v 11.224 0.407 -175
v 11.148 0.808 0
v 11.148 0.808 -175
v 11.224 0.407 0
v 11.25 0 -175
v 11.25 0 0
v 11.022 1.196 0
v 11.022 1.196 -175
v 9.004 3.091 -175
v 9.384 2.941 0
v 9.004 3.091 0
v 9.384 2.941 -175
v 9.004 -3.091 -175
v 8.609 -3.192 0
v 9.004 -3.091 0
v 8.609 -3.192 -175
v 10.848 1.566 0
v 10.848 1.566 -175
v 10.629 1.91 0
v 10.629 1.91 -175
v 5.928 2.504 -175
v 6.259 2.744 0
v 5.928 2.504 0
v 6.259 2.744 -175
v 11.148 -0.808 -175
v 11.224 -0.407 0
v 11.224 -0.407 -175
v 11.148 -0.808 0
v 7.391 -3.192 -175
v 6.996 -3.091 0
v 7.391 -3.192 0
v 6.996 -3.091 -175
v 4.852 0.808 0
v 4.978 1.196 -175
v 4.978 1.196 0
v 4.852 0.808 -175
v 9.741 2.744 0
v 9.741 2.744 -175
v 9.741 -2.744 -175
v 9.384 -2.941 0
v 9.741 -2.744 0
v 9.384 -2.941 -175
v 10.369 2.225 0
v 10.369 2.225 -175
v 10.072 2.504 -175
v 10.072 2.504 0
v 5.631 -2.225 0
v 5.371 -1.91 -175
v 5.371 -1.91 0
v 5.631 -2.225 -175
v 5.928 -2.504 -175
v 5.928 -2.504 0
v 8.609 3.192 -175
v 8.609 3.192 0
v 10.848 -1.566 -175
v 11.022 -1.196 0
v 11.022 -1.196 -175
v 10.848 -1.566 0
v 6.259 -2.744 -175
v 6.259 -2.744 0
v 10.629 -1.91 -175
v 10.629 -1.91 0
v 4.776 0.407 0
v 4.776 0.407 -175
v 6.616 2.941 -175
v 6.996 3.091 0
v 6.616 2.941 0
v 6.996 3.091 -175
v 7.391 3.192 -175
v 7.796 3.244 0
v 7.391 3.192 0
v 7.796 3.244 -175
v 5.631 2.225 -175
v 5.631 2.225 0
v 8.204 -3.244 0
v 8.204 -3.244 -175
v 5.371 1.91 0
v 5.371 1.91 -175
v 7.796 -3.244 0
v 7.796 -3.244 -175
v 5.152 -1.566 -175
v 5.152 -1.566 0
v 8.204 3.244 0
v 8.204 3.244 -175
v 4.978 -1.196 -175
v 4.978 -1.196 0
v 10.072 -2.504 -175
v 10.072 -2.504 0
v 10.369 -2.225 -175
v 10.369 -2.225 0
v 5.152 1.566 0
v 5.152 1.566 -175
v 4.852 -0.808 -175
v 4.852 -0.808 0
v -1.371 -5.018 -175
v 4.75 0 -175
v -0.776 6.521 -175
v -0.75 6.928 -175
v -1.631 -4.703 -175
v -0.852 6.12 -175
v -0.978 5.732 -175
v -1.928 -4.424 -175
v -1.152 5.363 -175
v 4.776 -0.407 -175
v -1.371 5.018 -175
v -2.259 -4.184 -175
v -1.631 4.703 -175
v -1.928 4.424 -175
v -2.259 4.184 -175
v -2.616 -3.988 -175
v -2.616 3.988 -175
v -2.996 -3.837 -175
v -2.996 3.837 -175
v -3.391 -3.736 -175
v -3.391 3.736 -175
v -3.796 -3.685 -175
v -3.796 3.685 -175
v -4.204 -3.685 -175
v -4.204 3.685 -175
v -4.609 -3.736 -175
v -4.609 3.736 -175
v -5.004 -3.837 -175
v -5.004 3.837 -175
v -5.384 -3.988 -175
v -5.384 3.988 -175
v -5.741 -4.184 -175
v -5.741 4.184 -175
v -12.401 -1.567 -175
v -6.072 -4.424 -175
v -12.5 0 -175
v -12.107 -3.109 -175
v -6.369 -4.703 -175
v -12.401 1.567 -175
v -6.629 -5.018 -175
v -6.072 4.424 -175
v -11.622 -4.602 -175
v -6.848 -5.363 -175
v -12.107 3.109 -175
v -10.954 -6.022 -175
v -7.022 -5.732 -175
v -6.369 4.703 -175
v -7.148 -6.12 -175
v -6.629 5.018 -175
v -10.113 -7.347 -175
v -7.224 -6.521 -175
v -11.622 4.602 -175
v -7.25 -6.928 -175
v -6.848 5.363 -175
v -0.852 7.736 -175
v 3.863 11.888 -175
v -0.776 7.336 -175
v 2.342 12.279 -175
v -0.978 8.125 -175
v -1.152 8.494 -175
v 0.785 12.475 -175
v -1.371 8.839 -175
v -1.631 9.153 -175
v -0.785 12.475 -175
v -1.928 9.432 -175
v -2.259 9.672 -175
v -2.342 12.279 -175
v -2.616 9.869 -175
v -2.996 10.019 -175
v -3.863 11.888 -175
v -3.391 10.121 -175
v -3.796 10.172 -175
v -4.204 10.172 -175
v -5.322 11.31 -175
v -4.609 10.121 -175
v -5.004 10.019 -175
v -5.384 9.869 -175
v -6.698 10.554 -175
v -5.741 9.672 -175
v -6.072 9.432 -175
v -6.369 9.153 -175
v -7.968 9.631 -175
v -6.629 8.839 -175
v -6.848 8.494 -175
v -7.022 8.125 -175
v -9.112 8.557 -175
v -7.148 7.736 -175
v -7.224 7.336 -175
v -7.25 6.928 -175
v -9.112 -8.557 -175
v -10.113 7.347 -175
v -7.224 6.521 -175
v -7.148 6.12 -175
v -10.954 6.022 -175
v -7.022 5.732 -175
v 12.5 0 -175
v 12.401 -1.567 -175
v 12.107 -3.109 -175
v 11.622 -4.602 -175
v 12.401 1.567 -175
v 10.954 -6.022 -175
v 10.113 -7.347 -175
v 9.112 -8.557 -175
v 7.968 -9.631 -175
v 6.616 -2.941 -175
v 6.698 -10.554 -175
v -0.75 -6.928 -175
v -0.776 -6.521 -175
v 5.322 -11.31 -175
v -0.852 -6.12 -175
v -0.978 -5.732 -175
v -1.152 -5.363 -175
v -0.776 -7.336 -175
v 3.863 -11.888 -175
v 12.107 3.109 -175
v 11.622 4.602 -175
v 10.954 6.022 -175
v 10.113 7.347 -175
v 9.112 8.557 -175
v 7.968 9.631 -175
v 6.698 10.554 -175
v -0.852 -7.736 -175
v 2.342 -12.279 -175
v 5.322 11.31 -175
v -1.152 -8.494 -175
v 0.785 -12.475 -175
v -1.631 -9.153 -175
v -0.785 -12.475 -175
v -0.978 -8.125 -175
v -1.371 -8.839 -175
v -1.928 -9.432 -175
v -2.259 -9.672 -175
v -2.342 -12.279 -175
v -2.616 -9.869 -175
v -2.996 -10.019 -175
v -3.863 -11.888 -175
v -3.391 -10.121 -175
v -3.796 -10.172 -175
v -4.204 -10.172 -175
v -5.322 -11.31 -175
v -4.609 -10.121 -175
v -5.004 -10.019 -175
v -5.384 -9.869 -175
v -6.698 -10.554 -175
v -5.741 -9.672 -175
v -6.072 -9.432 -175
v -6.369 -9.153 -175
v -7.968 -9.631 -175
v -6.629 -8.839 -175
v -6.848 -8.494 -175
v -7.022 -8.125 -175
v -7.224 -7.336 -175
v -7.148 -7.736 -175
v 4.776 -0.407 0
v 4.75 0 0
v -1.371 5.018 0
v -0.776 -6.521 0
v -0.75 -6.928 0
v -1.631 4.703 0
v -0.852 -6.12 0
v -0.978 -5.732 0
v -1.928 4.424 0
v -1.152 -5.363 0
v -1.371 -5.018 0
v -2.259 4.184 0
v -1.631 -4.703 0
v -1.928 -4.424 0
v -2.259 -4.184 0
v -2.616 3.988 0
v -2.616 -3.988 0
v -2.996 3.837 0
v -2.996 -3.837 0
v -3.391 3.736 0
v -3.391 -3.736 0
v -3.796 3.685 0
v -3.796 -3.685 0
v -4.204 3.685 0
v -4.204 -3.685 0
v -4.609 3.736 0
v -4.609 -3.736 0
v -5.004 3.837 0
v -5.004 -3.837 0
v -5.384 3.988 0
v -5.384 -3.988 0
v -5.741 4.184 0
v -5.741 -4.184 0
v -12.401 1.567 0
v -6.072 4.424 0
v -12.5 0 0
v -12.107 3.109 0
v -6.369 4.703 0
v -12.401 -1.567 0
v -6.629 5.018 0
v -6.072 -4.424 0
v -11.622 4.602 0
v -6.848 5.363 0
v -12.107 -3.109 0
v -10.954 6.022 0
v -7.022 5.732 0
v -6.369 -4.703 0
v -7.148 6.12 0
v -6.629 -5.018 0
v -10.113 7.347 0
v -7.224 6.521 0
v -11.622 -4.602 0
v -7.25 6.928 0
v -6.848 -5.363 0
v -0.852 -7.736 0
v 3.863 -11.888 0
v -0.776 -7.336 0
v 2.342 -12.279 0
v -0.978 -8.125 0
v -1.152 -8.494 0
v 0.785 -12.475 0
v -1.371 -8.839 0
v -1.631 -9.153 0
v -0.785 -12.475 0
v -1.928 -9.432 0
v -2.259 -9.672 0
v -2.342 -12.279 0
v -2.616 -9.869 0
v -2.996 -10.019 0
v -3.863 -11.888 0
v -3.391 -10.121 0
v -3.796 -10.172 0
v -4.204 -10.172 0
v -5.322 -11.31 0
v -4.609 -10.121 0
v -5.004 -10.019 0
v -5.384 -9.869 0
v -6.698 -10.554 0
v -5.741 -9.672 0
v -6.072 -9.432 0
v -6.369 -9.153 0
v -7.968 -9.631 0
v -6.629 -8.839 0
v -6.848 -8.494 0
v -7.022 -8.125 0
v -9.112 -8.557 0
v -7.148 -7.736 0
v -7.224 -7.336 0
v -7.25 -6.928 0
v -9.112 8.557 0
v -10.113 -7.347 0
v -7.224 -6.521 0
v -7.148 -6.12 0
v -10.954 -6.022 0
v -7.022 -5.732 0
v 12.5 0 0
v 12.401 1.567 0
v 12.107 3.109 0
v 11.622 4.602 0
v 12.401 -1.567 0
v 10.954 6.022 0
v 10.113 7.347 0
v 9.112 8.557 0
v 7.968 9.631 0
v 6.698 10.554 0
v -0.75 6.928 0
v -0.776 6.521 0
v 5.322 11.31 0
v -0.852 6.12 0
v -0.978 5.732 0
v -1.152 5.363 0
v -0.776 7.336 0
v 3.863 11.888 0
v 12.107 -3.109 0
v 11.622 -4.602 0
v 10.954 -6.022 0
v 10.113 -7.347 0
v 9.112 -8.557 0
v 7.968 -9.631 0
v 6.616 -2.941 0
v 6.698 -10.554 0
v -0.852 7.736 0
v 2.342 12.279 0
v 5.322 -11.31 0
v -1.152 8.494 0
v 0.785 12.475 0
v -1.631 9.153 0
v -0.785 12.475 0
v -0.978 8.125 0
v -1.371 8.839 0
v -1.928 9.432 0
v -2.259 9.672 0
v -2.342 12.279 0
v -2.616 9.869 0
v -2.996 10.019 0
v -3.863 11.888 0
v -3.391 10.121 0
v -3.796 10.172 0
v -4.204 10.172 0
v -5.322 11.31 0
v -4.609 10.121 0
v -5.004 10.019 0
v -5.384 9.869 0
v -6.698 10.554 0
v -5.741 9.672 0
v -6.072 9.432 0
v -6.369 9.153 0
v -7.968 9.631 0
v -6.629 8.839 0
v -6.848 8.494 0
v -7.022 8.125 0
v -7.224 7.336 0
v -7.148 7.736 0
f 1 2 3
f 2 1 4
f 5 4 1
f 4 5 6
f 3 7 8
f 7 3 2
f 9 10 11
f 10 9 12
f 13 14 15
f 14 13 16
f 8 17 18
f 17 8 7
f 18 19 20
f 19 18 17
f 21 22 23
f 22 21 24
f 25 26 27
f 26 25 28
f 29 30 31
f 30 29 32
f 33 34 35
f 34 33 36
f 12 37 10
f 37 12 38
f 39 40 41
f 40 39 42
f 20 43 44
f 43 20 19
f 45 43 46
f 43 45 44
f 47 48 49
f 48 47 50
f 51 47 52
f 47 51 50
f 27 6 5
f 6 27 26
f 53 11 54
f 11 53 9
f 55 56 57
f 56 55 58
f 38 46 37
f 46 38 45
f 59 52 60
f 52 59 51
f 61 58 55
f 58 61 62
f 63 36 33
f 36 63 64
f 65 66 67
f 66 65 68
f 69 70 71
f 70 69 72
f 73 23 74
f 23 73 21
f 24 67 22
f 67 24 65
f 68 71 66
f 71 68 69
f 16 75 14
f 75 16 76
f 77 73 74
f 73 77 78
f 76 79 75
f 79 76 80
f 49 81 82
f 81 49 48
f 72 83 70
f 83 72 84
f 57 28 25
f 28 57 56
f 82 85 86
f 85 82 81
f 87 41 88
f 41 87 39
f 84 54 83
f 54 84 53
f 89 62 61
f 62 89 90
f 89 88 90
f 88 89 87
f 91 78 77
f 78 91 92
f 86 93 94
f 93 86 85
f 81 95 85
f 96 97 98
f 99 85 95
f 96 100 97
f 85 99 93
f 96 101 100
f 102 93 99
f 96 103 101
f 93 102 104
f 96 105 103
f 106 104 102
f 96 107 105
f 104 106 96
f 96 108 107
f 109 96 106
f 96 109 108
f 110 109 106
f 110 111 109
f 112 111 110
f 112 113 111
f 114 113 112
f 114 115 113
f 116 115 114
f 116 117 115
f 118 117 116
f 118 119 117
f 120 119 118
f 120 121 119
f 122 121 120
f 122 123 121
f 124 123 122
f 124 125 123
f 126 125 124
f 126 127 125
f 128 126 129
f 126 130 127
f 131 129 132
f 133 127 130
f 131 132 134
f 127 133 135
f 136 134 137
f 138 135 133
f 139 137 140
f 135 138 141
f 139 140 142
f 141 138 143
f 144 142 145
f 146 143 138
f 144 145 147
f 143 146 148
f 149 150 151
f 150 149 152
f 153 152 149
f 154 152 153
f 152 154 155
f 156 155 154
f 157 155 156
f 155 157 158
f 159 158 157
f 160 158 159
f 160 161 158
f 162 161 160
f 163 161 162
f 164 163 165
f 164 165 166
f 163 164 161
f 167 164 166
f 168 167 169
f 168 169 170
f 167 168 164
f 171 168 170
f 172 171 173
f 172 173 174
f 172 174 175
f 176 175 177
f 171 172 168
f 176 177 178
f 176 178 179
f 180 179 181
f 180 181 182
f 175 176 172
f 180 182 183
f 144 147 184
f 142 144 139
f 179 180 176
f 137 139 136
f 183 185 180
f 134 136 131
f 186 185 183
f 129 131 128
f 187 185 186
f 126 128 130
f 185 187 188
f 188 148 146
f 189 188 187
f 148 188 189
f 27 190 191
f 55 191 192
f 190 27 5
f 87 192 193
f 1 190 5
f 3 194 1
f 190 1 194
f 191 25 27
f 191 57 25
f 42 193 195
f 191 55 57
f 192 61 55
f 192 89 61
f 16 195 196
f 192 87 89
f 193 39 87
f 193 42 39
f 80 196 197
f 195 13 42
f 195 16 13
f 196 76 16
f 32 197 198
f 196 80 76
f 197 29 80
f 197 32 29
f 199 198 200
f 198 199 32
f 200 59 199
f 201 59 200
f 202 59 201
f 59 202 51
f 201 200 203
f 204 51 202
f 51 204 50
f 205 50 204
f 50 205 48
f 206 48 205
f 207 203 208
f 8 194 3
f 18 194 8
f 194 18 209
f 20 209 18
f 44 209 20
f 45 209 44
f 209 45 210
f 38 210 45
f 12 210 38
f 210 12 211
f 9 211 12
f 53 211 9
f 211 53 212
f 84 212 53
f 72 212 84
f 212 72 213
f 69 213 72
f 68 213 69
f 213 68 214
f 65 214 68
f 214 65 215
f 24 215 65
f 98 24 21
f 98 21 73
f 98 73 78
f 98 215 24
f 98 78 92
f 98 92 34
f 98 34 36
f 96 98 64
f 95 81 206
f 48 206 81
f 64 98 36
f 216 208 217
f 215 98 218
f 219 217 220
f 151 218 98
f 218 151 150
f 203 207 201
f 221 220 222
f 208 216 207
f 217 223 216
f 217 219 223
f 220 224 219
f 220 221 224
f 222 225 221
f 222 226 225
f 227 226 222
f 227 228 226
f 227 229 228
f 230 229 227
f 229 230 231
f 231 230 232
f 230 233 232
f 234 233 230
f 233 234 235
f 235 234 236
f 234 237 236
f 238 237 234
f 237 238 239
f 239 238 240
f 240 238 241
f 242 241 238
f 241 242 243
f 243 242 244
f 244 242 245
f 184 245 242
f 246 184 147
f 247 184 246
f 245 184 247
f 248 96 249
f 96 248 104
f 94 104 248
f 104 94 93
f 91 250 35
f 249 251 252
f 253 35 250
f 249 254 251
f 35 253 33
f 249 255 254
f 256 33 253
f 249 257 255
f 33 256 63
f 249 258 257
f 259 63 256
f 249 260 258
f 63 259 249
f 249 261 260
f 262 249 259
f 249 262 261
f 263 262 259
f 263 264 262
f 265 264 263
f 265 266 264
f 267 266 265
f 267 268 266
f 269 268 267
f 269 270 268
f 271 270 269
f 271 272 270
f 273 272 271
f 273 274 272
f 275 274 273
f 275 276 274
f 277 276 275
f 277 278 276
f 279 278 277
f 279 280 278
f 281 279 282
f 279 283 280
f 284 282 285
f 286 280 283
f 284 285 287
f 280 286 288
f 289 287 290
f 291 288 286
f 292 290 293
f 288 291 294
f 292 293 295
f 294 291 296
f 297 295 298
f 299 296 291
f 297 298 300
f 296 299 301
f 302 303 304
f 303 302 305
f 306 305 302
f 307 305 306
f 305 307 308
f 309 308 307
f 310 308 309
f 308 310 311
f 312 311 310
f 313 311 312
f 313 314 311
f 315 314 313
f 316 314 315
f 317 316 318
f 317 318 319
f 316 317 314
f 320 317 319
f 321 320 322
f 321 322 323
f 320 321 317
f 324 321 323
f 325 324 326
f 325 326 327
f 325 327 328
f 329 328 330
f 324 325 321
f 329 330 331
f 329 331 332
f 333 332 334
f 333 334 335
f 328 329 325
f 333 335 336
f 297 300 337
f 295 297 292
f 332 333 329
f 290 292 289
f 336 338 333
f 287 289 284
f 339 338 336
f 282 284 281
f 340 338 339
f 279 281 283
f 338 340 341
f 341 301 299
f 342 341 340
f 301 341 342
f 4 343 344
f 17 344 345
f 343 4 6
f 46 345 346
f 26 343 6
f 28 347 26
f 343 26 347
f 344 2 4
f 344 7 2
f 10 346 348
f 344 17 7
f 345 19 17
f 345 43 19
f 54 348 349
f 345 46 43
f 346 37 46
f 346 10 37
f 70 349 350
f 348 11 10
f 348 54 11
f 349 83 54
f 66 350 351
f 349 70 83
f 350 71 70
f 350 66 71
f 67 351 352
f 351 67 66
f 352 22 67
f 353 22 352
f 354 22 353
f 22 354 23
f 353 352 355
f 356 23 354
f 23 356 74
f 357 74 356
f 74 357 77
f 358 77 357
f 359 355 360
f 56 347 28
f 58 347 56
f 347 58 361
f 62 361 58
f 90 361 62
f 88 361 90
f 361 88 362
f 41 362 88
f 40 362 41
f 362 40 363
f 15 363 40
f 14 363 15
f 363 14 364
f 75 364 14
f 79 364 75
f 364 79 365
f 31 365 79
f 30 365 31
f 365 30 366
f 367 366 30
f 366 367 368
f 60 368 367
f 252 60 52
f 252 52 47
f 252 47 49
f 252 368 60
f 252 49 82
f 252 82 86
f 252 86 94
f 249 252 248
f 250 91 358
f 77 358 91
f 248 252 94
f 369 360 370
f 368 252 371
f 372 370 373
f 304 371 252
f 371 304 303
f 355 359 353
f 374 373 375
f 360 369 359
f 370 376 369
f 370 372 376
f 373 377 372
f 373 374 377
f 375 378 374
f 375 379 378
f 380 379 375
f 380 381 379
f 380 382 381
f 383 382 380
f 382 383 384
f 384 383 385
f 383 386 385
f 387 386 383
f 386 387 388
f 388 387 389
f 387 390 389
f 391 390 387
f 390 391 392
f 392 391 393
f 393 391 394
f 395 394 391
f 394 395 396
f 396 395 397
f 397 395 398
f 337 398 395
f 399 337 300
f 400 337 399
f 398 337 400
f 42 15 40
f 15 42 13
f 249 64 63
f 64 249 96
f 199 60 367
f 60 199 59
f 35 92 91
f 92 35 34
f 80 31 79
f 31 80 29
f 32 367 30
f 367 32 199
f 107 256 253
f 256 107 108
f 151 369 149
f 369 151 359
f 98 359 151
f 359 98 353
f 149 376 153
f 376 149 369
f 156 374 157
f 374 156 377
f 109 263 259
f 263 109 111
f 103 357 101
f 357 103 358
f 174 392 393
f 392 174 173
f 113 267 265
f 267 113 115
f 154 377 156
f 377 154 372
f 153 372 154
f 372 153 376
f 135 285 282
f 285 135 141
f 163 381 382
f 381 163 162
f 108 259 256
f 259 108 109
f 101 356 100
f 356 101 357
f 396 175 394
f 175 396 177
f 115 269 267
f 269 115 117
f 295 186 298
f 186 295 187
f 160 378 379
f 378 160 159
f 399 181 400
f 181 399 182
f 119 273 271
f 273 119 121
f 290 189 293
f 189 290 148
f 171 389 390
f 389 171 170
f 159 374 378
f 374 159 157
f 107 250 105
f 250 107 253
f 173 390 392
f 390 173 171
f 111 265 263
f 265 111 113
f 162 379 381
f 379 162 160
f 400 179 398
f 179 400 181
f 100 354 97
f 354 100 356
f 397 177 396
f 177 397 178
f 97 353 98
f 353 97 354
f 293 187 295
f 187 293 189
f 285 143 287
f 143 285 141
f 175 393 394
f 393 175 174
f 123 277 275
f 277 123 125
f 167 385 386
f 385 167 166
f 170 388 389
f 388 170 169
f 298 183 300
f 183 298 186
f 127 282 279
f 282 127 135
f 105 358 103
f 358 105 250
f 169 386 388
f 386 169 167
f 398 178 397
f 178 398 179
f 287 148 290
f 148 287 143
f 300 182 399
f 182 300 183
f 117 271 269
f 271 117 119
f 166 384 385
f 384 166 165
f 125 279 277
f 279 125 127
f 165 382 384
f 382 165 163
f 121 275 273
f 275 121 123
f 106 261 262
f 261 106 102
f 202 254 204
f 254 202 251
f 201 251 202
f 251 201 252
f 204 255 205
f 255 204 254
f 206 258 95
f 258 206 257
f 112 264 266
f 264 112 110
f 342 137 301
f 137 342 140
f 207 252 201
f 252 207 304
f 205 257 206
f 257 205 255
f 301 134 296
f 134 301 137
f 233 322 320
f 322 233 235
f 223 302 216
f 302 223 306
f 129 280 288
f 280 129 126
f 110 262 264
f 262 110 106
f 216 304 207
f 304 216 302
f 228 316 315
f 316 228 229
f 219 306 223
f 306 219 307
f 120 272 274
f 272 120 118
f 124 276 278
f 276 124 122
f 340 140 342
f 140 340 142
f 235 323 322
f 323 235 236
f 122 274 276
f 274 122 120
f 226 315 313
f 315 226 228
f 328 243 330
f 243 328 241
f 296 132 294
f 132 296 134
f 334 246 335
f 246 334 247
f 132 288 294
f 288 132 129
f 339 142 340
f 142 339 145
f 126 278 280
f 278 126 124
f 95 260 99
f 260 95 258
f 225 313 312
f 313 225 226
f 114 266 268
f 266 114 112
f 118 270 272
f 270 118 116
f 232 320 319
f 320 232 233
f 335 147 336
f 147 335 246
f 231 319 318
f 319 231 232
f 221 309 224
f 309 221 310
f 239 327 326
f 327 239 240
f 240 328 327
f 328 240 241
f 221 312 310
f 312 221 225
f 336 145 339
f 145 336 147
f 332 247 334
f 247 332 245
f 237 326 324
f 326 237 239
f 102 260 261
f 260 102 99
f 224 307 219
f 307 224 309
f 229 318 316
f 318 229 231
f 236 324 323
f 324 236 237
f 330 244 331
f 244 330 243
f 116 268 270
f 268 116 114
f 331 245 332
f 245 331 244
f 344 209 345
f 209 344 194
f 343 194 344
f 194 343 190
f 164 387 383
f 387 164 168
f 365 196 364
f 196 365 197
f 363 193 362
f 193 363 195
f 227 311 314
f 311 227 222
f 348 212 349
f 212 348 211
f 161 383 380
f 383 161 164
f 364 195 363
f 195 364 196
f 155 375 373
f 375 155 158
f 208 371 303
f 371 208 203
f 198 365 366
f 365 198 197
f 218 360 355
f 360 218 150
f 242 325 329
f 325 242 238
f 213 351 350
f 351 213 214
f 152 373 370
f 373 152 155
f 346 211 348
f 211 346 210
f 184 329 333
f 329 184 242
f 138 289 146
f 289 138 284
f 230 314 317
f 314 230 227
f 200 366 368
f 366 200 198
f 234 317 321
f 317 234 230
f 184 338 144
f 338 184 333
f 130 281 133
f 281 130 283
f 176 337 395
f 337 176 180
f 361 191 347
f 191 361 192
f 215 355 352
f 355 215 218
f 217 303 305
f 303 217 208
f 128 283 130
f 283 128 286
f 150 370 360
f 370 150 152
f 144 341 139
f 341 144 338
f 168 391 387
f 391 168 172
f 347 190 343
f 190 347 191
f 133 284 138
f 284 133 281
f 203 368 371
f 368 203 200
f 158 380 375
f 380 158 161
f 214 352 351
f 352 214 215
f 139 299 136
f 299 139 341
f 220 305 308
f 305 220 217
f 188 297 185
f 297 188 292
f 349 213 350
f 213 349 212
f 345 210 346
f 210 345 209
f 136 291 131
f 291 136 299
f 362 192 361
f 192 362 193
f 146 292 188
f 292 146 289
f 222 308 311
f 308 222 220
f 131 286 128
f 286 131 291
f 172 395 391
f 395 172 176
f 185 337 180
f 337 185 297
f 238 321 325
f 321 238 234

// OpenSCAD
$fn = 50;


difference() {
	union() {
		translate(v = [0, 0, -175.0000000000]) {
			cylinder(h = 175, r = 12.5000000000);
		}
	}
	union() {
		#translate(v = [8.0000000000, 0.0000000000, -175]) {
			cylinder(h = 175, r = 3.2500000000);
		}
		#translate(v = [-4.0000000000, 6.9282032303, -175]) {
			cylinder(h = 175, r = 3.2500000000);
		}
		#translate(v = [-4.0000000000, -6.9282032303, -175]) {
			cylinder(h = 175, r = 3.2500000000);
		}
	}
}
